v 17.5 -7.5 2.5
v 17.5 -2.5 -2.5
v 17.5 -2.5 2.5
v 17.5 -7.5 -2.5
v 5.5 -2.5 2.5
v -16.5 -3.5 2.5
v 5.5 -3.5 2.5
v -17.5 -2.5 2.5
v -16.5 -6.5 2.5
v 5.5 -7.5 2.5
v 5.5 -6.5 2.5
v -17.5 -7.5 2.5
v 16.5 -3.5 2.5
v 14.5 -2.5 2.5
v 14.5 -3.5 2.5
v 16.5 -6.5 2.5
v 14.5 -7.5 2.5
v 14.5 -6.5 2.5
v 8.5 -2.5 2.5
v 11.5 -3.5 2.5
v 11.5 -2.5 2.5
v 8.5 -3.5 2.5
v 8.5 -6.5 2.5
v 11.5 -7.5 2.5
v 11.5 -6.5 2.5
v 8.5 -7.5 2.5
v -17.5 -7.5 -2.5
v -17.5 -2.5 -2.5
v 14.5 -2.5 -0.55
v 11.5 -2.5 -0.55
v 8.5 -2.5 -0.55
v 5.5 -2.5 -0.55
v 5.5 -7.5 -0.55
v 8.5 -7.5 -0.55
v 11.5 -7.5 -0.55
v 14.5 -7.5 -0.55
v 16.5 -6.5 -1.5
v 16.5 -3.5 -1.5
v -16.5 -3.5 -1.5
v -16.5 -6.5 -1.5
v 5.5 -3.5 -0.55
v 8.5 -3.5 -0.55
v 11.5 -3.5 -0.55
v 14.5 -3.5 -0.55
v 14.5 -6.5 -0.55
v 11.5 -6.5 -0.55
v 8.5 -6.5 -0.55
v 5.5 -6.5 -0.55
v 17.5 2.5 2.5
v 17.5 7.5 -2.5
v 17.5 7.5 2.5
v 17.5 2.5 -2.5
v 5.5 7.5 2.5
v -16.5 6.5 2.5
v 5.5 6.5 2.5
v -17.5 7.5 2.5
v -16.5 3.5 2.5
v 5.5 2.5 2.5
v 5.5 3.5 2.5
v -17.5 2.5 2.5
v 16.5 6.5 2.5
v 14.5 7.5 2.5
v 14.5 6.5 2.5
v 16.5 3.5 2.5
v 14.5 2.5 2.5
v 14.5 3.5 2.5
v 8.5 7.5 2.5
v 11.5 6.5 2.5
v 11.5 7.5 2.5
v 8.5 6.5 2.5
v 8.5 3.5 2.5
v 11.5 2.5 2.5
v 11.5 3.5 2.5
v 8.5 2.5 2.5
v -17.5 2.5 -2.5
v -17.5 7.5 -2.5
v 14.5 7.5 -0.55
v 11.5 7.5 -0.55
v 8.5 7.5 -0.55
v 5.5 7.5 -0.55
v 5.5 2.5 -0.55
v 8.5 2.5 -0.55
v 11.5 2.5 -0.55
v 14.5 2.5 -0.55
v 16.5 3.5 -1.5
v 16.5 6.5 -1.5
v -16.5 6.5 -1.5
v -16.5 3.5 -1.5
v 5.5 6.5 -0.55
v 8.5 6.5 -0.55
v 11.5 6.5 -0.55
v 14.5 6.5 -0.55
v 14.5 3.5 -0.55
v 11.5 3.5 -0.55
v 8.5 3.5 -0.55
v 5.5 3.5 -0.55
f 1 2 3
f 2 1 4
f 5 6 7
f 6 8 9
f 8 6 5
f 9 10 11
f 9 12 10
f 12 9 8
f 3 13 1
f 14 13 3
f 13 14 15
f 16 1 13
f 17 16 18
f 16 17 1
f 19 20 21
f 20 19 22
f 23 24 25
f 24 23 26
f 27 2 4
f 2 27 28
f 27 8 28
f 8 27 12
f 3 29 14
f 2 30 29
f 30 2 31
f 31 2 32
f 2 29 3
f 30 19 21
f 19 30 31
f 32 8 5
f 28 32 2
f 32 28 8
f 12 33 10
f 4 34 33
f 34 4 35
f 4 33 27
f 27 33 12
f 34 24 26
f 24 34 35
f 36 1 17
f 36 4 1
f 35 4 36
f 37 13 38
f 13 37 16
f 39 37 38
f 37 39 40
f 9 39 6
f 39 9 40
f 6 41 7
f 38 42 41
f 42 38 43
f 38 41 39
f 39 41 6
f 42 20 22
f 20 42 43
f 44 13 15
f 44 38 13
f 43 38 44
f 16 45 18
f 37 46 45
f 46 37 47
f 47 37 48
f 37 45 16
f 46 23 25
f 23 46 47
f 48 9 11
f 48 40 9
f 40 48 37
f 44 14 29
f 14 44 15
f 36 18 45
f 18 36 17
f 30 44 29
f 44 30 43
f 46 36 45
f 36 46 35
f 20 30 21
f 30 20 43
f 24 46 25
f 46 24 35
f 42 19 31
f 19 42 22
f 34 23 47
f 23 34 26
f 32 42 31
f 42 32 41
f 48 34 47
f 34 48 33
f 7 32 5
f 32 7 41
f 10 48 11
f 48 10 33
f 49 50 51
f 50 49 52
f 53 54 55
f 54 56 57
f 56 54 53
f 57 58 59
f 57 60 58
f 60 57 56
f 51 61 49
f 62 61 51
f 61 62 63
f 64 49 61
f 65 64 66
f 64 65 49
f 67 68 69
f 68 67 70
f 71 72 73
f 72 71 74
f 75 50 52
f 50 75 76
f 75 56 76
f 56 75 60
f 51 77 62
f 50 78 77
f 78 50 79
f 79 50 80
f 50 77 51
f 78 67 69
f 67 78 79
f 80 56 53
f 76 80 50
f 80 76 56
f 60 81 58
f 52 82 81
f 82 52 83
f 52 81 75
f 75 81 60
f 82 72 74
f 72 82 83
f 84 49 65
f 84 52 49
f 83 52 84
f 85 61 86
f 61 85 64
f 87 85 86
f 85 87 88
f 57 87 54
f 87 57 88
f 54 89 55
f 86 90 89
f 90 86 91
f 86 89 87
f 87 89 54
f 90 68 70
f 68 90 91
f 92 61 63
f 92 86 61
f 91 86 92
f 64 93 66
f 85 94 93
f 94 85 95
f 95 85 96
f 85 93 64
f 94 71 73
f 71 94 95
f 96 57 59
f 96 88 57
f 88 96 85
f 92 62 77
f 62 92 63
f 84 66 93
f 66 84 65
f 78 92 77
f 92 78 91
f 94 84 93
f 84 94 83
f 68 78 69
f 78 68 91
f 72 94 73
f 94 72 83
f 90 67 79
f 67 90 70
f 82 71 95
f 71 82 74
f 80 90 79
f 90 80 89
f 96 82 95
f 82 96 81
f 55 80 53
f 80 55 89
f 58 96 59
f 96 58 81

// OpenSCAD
// a set of "bumpers" to pack a screen, and laptop together, and doubles as a laptop + screen stand to lift up laptop, and hold the screen in front of the keyboard. 
// designed for Framework laptop, and a 15" usb-c screen from aliexpress.


/*
# TODO:
- use actual measurements
- create opposite slits in the back so sides can clipt together
- angle screen and laptop slits equal to clip slits
- align clip slit on one side to match at least one port on the Framework to allow for charging while packed away

*/


module side(y){
	translate([0,0+y,0])
	difference(){
		cube([35,5,5],center=true);
		translate([0,0,1])
		cube([33,3,5],center=true);
		// laptop slit
		translate([13,0,1])
		cube([3,5.1,3.1],center=true);
		// screen slit
		translate([7,0,1])
		cube([3,5.1,3.1],center=true);
	}
}

side(-5);
side(5);

// "laptop"
translate([7,0,10])
%cube([2,25,20],center=true);
